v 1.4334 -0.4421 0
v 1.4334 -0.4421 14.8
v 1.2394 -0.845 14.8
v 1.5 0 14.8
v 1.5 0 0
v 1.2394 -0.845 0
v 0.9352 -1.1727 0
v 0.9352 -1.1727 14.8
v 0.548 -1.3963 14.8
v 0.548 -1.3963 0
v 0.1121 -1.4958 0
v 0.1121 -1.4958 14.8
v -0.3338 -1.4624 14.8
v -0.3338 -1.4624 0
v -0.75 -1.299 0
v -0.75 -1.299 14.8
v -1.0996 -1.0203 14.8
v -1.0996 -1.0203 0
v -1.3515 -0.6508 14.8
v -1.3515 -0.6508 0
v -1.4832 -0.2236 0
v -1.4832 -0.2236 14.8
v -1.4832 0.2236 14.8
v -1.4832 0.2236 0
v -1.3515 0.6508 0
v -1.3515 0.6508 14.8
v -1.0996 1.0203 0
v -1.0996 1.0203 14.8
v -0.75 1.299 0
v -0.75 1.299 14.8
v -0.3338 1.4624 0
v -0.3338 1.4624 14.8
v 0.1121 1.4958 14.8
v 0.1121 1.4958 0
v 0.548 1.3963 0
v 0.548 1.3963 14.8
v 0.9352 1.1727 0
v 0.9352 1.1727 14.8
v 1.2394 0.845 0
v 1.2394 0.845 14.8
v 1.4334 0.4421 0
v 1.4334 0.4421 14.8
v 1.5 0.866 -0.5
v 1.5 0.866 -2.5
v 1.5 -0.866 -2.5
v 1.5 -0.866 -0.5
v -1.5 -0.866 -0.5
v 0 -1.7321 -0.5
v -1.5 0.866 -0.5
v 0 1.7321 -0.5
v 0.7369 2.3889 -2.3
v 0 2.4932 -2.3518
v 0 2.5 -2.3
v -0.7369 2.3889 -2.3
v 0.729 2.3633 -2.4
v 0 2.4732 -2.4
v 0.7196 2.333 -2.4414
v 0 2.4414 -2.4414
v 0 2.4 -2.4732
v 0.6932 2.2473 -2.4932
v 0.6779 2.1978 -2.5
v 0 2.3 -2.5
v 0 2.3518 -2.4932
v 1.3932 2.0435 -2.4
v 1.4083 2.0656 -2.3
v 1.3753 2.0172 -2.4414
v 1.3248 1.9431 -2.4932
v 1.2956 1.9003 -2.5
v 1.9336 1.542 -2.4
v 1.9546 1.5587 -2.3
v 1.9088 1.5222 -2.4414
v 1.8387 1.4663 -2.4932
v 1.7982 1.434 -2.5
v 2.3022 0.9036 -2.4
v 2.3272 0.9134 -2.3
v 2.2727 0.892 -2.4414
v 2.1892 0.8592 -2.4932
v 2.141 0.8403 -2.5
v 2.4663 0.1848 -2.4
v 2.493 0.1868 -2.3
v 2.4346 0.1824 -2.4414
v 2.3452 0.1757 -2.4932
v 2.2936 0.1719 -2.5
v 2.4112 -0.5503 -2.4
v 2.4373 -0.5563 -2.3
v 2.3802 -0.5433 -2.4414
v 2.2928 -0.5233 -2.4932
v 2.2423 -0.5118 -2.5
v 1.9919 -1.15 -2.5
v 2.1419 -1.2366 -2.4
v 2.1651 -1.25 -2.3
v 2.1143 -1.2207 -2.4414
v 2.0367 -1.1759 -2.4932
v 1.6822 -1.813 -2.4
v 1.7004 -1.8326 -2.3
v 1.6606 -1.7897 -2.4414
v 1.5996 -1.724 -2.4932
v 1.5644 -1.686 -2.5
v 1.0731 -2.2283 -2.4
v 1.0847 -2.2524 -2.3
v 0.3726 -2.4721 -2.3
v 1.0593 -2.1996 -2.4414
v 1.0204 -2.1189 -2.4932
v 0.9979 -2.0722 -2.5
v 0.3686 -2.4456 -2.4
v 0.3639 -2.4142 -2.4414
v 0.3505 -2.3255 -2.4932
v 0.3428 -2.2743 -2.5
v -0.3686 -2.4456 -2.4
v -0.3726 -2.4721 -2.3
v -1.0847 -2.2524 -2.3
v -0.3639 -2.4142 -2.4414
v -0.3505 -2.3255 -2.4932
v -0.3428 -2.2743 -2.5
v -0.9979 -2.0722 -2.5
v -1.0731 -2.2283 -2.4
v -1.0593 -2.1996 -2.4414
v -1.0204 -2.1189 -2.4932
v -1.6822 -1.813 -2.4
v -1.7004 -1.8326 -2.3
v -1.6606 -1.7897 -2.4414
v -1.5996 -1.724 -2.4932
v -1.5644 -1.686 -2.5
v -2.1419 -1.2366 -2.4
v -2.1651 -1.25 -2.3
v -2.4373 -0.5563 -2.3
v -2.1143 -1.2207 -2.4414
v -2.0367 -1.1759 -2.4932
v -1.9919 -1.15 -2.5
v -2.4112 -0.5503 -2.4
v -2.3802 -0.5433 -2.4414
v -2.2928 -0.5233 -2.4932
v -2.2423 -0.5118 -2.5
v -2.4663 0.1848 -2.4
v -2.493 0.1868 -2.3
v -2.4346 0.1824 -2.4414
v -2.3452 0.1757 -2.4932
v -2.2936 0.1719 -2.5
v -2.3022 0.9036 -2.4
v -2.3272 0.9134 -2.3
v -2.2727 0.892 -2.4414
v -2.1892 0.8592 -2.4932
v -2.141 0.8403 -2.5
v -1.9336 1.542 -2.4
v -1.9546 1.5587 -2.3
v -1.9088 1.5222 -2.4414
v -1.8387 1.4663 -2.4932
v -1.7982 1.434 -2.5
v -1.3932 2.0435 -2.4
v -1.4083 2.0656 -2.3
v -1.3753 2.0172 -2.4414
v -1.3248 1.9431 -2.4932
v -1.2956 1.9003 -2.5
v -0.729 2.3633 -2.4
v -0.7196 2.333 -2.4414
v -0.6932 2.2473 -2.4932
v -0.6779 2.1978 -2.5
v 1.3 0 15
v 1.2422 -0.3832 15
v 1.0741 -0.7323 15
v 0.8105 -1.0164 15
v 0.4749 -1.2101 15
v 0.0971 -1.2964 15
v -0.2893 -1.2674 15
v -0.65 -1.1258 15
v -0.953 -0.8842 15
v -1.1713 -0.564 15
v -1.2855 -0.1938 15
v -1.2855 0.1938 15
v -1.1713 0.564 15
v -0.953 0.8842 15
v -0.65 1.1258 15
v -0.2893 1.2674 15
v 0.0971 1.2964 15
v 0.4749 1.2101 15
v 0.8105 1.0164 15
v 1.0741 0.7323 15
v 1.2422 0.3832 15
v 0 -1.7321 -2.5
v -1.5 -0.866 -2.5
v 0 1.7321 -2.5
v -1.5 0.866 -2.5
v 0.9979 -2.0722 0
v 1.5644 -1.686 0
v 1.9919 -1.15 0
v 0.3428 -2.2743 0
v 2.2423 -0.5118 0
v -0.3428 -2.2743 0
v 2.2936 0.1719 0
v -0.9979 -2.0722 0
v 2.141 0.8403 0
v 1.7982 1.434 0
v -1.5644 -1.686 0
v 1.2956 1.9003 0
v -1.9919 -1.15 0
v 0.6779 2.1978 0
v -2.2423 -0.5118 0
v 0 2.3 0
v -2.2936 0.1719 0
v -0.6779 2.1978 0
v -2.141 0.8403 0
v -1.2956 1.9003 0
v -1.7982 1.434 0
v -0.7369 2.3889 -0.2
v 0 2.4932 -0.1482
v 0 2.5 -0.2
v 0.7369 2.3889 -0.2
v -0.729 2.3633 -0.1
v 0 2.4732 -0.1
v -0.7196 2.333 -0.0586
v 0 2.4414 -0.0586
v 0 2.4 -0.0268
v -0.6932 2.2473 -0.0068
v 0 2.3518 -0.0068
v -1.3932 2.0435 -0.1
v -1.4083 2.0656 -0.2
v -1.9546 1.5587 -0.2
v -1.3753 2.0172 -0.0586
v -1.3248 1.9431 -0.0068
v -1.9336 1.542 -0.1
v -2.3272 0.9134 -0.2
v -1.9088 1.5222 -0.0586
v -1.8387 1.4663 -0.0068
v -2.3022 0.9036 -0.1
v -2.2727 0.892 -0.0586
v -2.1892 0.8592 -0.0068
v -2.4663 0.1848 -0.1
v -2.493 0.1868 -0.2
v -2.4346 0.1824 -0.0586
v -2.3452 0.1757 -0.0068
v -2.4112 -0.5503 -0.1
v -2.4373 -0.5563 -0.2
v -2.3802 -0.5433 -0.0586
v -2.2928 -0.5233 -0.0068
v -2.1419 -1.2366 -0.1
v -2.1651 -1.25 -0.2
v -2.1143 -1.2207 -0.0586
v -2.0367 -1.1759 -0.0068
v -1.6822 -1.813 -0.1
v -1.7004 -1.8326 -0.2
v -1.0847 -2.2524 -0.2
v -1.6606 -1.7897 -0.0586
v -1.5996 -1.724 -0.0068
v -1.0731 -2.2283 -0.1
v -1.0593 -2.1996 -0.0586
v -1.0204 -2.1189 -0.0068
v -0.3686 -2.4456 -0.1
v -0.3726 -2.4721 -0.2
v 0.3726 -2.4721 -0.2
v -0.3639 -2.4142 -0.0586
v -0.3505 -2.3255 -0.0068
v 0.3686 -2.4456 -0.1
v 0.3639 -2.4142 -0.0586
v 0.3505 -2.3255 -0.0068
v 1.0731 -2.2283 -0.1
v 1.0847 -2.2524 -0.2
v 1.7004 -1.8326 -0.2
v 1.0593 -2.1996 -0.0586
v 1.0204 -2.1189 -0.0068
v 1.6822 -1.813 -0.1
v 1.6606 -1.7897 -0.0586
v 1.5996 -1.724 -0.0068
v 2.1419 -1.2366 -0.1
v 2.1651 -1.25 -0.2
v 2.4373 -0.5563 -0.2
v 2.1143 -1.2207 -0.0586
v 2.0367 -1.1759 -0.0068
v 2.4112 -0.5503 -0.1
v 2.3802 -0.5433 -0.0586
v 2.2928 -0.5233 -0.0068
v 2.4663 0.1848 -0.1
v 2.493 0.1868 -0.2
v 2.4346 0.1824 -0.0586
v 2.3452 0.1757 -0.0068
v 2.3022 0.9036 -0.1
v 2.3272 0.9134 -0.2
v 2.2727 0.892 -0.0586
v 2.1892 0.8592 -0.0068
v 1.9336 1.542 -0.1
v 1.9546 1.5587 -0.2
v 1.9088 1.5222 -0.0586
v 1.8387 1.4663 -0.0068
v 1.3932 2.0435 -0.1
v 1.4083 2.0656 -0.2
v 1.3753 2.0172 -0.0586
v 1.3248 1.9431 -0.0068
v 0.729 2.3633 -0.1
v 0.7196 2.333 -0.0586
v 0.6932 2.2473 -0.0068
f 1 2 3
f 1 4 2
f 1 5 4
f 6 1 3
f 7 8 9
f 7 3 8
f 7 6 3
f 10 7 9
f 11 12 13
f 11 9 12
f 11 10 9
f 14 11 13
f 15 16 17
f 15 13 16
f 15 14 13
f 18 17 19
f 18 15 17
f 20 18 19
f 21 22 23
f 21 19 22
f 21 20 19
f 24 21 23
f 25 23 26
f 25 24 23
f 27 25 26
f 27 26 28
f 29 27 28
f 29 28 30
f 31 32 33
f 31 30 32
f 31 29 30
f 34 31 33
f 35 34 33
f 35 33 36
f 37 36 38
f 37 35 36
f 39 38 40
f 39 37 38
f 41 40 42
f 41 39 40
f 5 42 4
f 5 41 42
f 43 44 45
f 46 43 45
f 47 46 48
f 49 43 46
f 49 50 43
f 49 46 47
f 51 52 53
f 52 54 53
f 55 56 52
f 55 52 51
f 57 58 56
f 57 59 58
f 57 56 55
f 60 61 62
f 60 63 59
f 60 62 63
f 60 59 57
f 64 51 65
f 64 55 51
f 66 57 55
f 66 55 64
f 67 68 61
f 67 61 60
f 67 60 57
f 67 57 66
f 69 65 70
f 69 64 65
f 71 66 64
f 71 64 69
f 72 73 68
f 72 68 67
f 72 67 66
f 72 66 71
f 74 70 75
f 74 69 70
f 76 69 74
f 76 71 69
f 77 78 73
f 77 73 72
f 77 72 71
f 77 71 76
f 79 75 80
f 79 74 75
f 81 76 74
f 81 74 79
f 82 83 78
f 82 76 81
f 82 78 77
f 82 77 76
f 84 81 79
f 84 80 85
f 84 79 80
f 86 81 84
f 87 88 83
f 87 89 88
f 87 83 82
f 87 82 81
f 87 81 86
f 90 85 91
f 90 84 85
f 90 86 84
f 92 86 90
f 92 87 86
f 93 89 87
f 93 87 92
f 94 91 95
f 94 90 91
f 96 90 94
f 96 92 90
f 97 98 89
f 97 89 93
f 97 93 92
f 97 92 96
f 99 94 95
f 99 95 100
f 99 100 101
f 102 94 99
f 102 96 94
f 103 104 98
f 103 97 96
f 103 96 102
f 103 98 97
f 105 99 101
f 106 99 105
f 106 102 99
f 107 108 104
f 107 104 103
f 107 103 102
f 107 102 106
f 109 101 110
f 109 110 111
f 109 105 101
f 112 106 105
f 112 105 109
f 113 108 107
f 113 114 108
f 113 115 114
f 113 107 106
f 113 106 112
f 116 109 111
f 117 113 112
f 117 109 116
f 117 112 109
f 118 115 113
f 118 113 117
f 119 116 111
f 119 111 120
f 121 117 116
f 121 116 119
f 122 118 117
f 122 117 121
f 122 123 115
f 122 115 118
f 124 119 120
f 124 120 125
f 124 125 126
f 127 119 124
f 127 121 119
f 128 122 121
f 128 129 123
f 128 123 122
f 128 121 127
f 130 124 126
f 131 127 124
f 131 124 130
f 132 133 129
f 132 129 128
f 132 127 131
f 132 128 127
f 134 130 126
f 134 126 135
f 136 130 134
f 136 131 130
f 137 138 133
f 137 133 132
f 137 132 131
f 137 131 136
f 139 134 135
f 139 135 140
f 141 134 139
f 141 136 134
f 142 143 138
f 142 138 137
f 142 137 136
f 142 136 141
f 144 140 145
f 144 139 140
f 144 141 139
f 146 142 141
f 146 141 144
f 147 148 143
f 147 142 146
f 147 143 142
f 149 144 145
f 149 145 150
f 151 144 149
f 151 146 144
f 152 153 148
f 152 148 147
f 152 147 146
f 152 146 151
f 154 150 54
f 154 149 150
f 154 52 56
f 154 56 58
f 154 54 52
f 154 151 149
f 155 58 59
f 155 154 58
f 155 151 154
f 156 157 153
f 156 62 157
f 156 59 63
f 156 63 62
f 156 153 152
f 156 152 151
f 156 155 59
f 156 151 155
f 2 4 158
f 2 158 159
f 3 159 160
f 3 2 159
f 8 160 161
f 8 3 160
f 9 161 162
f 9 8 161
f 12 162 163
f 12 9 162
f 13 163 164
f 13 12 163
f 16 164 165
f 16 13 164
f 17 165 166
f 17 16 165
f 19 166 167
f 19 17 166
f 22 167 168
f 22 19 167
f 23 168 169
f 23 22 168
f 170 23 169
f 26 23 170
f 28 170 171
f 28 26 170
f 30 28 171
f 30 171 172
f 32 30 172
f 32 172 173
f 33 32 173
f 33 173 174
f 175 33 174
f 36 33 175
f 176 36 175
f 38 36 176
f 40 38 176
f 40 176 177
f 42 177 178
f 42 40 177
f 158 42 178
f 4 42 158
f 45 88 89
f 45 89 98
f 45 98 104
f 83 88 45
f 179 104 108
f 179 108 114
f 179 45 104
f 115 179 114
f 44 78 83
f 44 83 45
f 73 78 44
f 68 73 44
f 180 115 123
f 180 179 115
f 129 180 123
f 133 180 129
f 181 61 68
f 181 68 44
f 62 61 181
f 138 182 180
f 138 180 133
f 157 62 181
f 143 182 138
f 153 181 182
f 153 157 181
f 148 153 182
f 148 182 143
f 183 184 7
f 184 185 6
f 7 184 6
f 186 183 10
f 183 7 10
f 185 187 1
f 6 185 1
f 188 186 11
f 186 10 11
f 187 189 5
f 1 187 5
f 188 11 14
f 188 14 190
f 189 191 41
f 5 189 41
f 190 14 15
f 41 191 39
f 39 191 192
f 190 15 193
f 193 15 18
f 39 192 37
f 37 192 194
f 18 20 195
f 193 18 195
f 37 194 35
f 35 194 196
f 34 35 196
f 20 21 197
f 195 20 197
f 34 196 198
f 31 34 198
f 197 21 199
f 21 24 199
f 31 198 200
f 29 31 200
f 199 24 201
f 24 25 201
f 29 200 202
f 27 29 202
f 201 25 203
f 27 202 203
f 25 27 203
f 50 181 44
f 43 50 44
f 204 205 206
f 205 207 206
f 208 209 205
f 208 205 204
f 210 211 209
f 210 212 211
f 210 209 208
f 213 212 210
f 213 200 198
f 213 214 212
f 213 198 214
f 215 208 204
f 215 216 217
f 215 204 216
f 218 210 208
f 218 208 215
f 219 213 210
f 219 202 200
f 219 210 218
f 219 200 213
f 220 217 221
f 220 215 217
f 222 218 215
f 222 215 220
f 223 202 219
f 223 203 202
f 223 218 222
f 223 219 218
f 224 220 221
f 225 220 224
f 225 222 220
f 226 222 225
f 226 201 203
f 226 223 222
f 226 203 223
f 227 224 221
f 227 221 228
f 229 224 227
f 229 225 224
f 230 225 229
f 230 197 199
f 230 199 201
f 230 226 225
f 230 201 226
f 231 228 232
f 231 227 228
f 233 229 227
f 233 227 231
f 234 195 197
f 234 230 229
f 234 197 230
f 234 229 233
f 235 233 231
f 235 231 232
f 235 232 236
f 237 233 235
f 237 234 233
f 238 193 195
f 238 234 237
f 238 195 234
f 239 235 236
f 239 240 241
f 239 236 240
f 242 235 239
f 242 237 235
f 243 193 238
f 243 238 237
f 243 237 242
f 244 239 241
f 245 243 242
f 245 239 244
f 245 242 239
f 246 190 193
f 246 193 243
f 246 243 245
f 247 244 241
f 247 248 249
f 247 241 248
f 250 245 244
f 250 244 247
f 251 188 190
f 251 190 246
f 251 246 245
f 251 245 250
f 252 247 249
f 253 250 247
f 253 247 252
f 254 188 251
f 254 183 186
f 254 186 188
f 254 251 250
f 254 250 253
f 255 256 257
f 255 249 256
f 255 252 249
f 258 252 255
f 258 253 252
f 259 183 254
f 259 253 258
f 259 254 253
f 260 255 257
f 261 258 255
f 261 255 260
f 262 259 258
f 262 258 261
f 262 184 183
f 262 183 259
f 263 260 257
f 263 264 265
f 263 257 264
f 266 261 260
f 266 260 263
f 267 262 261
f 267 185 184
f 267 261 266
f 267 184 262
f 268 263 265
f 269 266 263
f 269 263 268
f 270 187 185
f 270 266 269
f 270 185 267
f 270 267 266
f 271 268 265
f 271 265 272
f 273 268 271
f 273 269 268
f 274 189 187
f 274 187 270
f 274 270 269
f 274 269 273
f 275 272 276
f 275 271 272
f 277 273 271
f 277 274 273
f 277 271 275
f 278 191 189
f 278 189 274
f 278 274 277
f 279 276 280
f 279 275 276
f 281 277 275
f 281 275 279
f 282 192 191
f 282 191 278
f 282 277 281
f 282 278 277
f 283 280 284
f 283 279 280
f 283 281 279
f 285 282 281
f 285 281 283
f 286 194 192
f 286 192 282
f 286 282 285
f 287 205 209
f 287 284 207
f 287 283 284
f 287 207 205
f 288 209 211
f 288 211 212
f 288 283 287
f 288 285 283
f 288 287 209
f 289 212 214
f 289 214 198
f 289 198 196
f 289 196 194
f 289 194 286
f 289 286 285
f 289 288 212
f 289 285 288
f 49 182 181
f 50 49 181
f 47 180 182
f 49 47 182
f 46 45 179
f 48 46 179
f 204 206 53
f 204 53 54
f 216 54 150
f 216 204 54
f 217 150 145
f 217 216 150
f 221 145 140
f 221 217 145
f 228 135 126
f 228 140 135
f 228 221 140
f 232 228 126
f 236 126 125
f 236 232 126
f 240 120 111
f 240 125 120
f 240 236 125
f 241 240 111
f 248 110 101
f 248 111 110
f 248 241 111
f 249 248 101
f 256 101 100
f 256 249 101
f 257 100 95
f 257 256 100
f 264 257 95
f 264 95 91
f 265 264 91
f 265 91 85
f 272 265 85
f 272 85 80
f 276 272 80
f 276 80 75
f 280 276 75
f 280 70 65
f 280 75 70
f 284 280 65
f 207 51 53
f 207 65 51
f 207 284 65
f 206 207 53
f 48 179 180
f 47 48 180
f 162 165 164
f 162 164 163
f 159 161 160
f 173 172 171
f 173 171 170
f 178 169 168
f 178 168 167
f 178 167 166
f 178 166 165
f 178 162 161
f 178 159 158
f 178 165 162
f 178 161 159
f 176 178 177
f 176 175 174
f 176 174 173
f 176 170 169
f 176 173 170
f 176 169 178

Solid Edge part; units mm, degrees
sketch "Sketch1" plane through (0, 0, 0) normal (0, 0, 1) x (1, 0, 0)
  circle A0 centre (0, 0) radius 1.5
extrude "Protrusion1" add sketch "Sketch1" along normal blind 15
sketch "Sketch2" plane through (0, 0, 0) normal (0, 0, -1) x (0, 1, 0)
  circle A0 centre (0, 0) radius 2.5
extrude "ExtrudedProtrusion_2" add sketch "Sketch2" along normal blind 2.5
fillet "Round_1" radius 0.2 2 edges at (0, -2.5, -2.5) (0, -2.5, 0)
sketch "Sketch3" plane through (0, 0, -2.5) normal (0, 0, -1) x (0, 1, 0)
  line L0 (-0.866, 1.5) -> (-1.7321, 0)
  line L1 (-1.7321, 0) -> (-0.866, -1.5)
  line L2 (-0.866, -1.5) -> (0.866, -1.5)
  line L3 (0.866, -1.5) -> (1.7321, 0)
  line L4 (1.7321, 0) -> (0.866, 1.5)
  line L5 (0.866, 1.5) -> (-0.866, 1.5)
extrude "ExtrudedCutout_1" cut sketch "Sketch3" against normal blind 2
chamfer "Chamfer_1" distance 0.2 angle 45 1 edges at (-1.5, 0, 15) measured on face at (-1.03, -0.97, 15)
cosmetic_thread "Thread1" size "M3"
